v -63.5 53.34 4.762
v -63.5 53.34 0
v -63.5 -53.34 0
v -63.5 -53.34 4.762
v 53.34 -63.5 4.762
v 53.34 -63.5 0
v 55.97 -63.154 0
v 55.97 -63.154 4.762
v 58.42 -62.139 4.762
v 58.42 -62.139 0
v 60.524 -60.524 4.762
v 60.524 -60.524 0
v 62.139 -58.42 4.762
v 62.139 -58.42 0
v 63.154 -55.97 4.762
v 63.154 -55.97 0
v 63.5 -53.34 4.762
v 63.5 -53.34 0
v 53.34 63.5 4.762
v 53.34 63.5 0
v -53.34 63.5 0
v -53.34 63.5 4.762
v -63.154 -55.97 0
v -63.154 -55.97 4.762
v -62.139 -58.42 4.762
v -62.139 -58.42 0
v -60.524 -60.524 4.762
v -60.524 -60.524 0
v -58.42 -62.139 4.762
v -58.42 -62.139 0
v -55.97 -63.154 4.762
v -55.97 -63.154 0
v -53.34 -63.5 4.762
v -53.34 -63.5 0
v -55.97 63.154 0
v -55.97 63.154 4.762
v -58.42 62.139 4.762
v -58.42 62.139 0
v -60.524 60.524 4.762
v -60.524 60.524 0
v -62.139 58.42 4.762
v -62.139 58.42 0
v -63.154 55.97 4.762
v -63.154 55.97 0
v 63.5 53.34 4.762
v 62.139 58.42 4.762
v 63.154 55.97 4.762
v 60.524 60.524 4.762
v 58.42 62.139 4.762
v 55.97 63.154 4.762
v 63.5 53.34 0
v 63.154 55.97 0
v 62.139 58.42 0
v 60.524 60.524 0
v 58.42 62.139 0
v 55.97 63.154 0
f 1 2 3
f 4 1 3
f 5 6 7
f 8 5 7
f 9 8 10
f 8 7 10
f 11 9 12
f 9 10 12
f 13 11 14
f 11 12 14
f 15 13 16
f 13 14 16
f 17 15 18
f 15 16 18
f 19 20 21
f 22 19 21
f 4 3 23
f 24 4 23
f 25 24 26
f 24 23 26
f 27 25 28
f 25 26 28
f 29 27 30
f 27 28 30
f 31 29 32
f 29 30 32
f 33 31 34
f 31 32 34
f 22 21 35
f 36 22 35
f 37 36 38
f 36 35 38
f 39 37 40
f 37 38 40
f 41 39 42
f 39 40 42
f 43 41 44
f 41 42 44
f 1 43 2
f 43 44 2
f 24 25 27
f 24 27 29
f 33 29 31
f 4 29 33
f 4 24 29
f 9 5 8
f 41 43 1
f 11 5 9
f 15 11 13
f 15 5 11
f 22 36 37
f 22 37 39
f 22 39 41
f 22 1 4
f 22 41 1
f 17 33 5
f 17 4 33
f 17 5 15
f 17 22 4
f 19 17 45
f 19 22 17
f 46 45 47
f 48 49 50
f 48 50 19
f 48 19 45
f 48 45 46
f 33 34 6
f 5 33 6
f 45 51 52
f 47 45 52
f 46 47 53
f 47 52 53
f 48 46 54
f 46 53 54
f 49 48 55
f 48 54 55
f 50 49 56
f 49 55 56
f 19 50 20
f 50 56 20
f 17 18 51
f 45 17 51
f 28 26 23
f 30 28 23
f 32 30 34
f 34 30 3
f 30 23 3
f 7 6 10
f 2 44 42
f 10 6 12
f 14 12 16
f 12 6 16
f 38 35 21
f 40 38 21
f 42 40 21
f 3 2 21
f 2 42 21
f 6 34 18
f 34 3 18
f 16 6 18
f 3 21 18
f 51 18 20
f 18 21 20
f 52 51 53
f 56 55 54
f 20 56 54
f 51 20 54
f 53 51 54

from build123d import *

# Parameters (mm, degrees)
BOSS_EXTRUDE1_DEPTH = 4.7625


with BuildPart() as part:
    # Sketch1 → Boss-Extrude1 (new body)
    with BuildSketch(Plane.XY):
        with BuildLine():
            Line((53.34, 63.5), (-53.34, 63.5))
            ThreePointArc((-53.34, 63.5), (-60.524204897, 60.524204897), (-63.5, 53.34))
            Line((-63.5, 53.34), (-63.5, -53.34))
            ThreePointArc((-63.5, -53.34), (-60.524204897, -60.524204897), (-53.34, -63.5))
            Line((-53.34, -63.5), (53.34, -63.5))
            ThreePointArc((53.34, -63.5), (60.524204897, -60.524204897), (63.5, -53.34))
            Line((63.5, -53.34), (63.5, 53.34))
            ThreePointArc((63.5, 53.34), (60.524204897, 60.524204897), (53.34, 63.5))
        make_face()
        with BuildLine():
            ThreePointArc((58.42, 53.34), (56.932102448, 56.932102448), (53.34, 58.42))
            Line((53.34, 58.42), (-53.34, 58.42))
            ThreePointArc((-53.34, 58.42), (-56.932102448, 56.932102448), (-58.42, 53.34))
            Line((-58.42, 53.34), (-58.42, -53.34))
            ThreePointArc((-58.42, -53.34), (-56.932102448, -56.932102448), (-53.34, -58.42))
            Line((-53.34, -58.42), (53.34, -58.42))
            ThreePointArc((53.34, -58.42), (56.932102448, -56.932102448), (58.42, -53.34))
            Line((58.42, -53.34), (58.42, 53.34))
        make_face(mode=Mode.SUBTRACT)
        with BuildLine():
            Line((58.42, 53.34), (58.42, -53.34))
            ThreePointArc((58.42, -53.34), (56.932102448, -56.932102448), (53.34, -58.42))
            Line((53.34, -58.42), (-53.34, -58.42))
            ThreePointArc((-53.34, -58.42), (-56.932102448, -56.932102448), (-58.42, -53.34))
            Line((-58.42, -53.34), (-58.42, 53.34))
            ThreePointArc((-58.42, 53.34), (-56.932102448, 56.932102448), (-53.34, 58.42))
            Line((-53.34, 58.42), (53.34, 58.42))
            ThreePointArc((53.34, 58.42), (56.932102448, 56.932102448), (58.42, 53.34))
        make_face()
    extrude(amount=BOSS_EXTRUDE1_DEPTH)


solid = part.part
